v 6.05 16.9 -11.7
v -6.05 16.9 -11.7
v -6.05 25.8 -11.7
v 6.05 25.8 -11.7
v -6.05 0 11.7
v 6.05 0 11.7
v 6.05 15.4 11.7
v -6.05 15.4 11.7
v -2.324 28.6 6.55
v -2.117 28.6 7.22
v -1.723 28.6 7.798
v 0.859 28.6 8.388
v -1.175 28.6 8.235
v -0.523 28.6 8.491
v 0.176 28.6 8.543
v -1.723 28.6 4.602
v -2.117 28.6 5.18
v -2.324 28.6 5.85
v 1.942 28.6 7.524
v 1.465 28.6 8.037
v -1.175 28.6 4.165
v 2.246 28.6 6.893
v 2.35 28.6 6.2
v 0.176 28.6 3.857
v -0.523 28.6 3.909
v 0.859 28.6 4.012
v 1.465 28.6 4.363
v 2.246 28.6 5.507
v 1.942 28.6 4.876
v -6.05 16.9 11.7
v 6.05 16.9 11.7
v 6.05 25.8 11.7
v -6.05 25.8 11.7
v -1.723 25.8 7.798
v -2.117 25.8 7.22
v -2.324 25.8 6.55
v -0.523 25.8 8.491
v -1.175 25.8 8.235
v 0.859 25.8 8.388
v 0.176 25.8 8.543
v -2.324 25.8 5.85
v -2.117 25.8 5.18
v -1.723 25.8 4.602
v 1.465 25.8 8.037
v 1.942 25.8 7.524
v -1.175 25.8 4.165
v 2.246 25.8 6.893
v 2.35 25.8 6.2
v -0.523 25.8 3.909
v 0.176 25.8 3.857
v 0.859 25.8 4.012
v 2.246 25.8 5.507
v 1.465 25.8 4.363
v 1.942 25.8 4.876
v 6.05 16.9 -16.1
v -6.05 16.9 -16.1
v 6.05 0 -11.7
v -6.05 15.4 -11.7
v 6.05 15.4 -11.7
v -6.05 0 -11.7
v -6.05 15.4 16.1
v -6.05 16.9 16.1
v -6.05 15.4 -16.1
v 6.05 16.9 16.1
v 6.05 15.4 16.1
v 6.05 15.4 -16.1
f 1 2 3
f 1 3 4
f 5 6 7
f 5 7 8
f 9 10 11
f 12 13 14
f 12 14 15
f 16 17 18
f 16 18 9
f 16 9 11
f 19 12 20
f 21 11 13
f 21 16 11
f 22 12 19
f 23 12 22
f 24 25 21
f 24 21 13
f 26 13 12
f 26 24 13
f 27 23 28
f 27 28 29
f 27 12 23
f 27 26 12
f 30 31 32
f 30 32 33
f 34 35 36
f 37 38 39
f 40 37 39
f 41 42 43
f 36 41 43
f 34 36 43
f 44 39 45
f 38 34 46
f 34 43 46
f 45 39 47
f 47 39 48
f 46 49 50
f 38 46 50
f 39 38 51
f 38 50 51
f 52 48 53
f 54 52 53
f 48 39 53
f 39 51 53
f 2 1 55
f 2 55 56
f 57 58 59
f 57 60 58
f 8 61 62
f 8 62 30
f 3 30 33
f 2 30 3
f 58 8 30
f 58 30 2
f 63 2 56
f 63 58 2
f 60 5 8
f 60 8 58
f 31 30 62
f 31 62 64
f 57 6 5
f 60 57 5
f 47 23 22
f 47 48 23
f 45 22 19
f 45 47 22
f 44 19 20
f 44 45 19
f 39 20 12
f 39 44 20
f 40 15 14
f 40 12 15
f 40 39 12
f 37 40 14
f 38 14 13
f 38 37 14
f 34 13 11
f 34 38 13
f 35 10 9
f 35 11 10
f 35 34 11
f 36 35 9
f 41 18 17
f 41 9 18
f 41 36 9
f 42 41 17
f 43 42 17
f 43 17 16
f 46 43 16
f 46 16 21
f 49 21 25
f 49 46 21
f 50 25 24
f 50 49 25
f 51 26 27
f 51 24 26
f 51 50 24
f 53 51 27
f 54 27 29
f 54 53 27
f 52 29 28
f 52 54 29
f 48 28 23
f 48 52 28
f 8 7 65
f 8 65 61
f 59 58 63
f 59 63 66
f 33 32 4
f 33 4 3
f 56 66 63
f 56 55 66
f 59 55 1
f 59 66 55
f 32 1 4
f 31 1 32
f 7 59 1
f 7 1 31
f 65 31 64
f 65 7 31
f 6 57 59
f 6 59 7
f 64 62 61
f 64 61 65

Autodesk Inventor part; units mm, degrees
ref_plane "YZ Plane" through (0, 0, 0) normal (1, 0, 0) x (0, 1, 0)
ref_plane "XZ Plane" through (0, 0, 0) normal (0, 1, 0) x (-1, 0, 0)
ref_plane "XY Plane" through (0, 0, 0) normal (0, 0, 1) x (1, 0, 0)
sketch "Sketch1" plane through (0, 0, 0) normal (0, 1, 0) x (-1, 0, 0)
  line L0 (6.05, -11.7) -> (-6.05, -11.7)
  line L1 (-6.05, -11.7) -> (-6.05, 11.7)
  line L2 (-6.05, 11.7) -> (6.05, 11.7)
  line L3 (6.05, 11.7) -> (6.05, -11.7)
  line L4 (6.05, -11.7) -> (-6.05, 11.7) construction
  line L5 (-6.05, -11.7) -> (6.05, 11.7) construction
  point P0 (0, 0)
  dimension "d0" = 12.1
  dimension "d1" = 23.4
extrude "Extrusion1" add sketch "Sketch1" along normal blind 25.8
sketch "Sketch2" plane through (-6.05, 0, 11.7) normal (0, 0, 1) x (1, 0, 0)
  line L0 (12.1, 0) -> (0, 0) projected
  line L1 (12.1, 0) -> (12.1, 25.8) projected
  line L2 (0, 0) -> (0, 25.8) projected
  line L3 (0, 16.9) -> (12.1, 16.9)
  line L4 (12.1, 16.9) -> (12.1, 15.4)
  line L5 (12.1, 15.4) -> (0, 15.4)
  line L6 (0, 15.4) -> (0, 16.9)
  point P0 (6.05, 0)
  dimension "d4" = 1.5
  dimension "d5" = 15.4
extrude "Extrusion2" add sketch "Sketch2" along normal blind 4.4 contours L5 L2 L3 L1
sketch "Sketch3" plane through (6.05, 0, -11.7) normal (0, 0, -1) x (-1, 0, 0)
  line L0 (12.1, 0) -> (0, 0) projected
  line L1 (12.1, 0) -> (12.1, 25.8) projected
  line L2 (0, 0) -> (0, 25.8) projected
  line L3 (0, 16.9) -> (12.1, 16.9)
  line L4 (12.1, 16.9) -> (12.1, 15.4)
  line L5 (12.1, 15.4) -> (0, 15.4)
  line L6 (0, 15.4) -> (0, 16.9)
  point P0 (6.05, 0)
  dimension "d8" = 1.5
  dimension "d9" = 15.4
extrude "Extrusion3" add sketch "Sketch3" along normal blind 4.4 contours L5 L2 L3 L1
sketch "Sketch4" plane through (0, 25.8, 0) normal (0, 1, 0) x (1, 0, 0)
  line L0 (-6.05, -11.7) -> (6.05, -11.7) projected
  line L1 (6.05, -11.7) -> (6.05, 11.7) projected
  circle A0 centre (0, -6.2) radius 2.35
  line L2 (0, 0) -> (0, -19.8821) construction
  dimension "d12" = 4.7
  dimension "d13" = 5.5
extrude "Extrusion4" add sketch "Sketch4" along normal blind 2.8 separate body
properties part number "ServoMotor_SubSize"
